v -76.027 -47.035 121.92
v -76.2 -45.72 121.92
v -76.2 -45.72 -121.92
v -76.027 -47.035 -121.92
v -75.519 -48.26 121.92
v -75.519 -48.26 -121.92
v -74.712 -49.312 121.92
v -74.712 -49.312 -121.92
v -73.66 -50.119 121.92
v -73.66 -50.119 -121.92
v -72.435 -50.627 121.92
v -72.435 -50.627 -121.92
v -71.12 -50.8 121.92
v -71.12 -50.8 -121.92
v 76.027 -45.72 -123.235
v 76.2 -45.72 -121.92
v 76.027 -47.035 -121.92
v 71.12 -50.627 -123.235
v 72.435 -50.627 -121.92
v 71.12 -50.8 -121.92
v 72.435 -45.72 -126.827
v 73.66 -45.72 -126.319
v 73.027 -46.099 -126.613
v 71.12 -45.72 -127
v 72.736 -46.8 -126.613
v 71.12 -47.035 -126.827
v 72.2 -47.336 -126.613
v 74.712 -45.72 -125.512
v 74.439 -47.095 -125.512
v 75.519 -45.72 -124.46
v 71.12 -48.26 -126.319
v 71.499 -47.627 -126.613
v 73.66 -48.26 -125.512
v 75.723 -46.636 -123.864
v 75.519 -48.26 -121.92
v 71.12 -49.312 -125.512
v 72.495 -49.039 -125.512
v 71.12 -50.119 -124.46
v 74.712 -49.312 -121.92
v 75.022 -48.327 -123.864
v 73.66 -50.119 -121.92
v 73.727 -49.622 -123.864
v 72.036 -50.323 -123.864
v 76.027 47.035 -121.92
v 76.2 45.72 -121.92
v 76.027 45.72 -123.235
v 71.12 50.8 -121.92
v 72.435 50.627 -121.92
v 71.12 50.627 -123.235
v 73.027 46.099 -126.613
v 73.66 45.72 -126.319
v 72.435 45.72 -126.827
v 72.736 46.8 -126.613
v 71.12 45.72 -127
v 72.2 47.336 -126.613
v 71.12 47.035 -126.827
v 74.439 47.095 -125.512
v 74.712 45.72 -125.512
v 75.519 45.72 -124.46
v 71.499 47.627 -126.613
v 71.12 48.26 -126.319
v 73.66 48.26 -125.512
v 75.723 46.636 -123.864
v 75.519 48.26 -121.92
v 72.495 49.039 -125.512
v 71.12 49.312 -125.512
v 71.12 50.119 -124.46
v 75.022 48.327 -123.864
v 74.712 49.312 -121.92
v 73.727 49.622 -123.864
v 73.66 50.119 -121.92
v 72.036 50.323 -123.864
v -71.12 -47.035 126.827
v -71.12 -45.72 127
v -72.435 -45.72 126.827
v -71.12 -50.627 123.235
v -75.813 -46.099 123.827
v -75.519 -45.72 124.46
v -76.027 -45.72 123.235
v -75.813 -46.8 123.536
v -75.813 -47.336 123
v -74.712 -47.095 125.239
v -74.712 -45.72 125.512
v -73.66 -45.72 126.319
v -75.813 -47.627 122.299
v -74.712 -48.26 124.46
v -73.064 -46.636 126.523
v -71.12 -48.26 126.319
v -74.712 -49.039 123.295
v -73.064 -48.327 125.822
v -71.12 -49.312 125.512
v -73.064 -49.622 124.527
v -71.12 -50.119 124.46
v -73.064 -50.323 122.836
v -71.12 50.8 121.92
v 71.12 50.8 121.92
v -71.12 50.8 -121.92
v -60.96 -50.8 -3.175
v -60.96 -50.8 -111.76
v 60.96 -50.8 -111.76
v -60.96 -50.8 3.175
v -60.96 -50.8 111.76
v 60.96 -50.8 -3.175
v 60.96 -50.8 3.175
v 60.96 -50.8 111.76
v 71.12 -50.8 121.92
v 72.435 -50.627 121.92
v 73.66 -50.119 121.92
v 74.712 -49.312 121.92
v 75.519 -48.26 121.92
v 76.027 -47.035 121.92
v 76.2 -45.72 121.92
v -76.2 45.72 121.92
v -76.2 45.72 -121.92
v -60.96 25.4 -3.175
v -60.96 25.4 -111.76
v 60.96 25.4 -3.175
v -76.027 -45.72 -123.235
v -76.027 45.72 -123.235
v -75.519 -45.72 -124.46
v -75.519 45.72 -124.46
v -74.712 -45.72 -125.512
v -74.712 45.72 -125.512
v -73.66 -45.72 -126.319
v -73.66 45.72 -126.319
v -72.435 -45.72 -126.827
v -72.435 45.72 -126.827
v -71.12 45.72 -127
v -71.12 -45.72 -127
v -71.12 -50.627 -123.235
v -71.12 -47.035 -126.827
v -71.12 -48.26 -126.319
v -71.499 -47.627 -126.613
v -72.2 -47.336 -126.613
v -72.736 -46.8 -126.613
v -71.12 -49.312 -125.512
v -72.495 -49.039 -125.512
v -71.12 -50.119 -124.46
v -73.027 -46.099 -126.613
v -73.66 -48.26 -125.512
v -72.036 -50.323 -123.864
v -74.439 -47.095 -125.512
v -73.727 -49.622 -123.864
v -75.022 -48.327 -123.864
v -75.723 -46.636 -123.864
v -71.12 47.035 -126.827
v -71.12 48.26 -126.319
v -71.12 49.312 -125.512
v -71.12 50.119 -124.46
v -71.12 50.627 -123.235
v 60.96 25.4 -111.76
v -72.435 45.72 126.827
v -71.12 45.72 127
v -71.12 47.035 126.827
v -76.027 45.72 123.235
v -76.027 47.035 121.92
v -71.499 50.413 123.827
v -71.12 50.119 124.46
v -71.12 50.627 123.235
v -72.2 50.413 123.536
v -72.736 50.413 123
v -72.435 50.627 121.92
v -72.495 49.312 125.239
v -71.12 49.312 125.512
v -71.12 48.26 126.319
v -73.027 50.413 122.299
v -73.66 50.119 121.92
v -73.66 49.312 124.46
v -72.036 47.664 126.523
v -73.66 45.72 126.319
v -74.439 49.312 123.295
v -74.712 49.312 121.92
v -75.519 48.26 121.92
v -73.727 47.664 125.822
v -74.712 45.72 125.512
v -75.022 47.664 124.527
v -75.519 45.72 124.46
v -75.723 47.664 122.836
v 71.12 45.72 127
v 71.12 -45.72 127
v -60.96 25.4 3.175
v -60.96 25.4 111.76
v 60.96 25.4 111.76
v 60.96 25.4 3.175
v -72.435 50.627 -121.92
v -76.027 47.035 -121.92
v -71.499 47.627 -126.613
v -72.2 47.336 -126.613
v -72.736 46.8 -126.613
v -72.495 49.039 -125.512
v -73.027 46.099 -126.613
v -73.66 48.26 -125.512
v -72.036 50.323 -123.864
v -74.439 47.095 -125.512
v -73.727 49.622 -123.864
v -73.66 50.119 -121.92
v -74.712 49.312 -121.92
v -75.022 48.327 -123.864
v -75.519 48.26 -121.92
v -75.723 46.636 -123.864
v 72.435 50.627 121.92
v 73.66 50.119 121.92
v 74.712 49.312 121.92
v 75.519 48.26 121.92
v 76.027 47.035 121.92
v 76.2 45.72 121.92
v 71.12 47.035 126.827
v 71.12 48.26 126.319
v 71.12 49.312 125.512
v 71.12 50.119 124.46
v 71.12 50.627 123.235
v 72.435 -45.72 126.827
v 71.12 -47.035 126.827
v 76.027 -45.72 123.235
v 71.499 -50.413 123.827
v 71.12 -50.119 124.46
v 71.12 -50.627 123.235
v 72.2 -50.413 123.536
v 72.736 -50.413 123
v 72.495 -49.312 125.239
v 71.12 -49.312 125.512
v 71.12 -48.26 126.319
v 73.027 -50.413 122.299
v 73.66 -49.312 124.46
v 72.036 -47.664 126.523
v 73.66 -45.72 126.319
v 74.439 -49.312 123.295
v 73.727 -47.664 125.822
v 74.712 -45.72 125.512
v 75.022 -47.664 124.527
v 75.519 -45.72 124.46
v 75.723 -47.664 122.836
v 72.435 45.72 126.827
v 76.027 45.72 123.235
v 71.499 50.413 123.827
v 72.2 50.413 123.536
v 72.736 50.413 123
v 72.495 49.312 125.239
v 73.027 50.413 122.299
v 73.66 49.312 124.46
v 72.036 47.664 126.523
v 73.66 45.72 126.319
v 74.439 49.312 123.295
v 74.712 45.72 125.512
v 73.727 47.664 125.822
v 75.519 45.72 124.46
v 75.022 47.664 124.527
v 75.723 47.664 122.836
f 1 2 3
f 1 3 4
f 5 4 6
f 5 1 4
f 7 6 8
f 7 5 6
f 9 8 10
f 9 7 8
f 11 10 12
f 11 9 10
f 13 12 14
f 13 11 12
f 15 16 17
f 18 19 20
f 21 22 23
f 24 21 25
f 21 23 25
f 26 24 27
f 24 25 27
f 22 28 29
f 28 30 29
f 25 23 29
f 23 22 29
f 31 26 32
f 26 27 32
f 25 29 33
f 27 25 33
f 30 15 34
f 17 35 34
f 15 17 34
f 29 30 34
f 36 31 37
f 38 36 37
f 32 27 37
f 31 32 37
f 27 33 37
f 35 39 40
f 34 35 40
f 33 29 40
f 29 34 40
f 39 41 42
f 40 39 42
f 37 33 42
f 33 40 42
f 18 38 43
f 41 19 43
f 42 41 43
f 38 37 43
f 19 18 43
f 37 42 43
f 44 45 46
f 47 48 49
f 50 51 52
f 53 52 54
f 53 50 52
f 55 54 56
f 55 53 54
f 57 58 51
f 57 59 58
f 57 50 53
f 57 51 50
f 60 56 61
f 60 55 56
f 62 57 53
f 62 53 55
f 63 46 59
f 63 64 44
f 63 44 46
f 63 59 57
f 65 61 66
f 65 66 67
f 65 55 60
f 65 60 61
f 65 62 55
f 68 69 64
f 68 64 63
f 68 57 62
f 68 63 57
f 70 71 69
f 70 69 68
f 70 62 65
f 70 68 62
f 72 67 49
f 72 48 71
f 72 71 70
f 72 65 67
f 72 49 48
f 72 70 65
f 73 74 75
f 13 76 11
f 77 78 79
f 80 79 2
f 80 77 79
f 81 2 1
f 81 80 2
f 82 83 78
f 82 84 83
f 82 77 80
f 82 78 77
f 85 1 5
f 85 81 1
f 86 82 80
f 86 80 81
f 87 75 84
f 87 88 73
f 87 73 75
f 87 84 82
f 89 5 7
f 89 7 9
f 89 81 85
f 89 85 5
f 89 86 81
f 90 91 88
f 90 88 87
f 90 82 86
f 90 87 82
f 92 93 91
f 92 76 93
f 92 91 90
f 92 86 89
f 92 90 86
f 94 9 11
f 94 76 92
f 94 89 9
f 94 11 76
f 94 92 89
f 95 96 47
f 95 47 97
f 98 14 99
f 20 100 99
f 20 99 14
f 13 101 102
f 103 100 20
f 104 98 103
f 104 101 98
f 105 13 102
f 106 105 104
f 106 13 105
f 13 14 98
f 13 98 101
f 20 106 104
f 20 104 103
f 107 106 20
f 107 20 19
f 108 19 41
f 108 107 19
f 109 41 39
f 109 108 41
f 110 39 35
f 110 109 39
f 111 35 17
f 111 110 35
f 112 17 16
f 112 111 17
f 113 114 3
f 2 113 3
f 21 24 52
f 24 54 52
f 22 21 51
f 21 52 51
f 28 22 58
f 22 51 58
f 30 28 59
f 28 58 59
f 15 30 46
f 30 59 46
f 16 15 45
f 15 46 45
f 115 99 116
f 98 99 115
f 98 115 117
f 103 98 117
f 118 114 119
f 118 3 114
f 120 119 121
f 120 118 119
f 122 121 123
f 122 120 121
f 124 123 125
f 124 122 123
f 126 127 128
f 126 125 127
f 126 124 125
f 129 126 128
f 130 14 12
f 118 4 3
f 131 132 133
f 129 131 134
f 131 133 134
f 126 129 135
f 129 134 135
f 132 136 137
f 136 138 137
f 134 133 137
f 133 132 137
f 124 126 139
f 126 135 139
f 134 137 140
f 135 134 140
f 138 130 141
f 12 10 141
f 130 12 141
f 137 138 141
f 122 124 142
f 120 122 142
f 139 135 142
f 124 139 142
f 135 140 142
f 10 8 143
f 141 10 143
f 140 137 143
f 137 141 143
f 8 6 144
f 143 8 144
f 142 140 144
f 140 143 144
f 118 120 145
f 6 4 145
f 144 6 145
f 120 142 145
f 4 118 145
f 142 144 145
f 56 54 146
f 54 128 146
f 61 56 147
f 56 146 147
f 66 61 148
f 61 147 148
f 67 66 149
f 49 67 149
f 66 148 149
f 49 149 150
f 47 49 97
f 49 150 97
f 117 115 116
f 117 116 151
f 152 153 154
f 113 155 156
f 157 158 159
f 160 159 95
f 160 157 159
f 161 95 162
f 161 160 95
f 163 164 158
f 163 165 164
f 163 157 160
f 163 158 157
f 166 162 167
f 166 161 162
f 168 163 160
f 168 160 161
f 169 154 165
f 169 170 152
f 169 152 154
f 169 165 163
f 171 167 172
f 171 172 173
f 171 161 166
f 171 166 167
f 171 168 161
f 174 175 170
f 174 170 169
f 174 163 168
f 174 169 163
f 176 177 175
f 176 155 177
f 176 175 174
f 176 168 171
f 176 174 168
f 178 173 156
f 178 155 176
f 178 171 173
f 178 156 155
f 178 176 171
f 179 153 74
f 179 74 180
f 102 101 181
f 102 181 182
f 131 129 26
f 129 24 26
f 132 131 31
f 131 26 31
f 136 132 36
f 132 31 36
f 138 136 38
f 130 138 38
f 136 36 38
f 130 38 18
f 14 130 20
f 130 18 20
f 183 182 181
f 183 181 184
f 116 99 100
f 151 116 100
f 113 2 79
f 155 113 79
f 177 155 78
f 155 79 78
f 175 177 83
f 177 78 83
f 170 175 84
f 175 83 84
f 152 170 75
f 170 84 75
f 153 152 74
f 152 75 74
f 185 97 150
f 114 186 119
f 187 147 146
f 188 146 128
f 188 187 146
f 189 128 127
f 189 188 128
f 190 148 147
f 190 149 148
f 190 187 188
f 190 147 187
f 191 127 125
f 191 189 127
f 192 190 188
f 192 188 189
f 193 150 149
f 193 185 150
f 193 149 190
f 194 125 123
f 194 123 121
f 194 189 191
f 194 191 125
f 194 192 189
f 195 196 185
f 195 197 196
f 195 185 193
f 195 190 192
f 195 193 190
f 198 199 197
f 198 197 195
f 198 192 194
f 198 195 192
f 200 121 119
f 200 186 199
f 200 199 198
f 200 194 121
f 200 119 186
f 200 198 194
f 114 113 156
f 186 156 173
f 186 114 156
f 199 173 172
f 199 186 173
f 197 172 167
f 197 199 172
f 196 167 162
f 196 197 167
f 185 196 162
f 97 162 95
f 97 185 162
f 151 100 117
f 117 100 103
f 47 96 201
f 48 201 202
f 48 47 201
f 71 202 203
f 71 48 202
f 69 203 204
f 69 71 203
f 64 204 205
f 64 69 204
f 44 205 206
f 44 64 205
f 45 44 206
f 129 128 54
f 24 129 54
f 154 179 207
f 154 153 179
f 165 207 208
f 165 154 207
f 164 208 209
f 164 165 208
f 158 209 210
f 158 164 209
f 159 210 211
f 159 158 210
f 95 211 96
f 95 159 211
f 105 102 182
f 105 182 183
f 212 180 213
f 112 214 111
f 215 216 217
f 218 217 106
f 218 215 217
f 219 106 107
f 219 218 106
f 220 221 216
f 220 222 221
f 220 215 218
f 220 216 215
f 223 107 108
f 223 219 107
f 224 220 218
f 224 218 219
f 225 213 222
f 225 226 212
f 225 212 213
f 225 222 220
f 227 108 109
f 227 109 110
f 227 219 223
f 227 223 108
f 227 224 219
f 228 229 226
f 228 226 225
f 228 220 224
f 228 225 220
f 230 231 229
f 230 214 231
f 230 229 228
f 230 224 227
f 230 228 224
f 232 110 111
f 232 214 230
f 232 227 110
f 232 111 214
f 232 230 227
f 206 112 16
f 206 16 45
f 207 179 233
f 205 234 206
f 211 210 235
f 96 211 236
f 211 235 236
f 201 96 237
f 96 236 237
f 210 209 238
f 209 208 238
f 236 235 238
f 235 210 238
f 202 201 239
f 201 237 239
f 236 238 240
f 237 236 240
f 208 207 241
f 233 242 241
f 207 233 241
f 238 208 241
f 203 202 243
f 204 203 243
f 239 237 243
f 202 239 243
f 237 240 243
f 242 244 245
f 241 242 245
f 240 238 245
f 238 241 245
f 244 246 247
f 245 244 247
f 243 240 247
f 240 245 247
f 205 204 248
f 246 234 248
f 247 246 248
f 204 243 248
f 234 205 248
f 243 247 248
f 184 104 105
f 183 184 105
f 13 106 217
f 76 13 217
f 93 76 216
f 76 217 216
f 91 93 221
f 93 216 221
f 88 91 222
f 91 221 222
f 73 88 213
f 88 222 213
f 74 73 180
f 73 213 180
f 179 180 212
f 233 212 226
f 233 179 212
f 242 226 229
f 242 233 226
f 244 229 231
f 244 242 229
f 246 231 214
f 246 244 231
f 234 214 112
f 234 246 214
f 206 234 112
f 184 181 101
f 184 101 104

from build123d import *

# Parameters (mm, degrees)
F1_DEPTH = 127
F2_W     = 121.92
F2_H     = 223.52
F3_DEPTH = 76.2
F4_R     = 5.08
F5_W     = 121.92
F5_H     = 6.35
F6_DEPTH = 76.2


with BuildPart() as f1:
    # F0 (on Top) → F1 (new body, symmetric)
    with BuildSketch(Plane.XY):
        Polygon((-76.2, 50.8), (-76.2, -50.8), (-68.293229, -50.8), (68.293229, -50.8), (76.2, -50.8), (76.2, 50.8), align=None)
    extrude(amount=F1_DEPTH, both=True)

    # F2 (on face) → F3 (cut)
    with BuildSketch(Plane.XZ.offset(50.8)):
        Rectangle(F2_W, F2_H)
    extrude(amount=-F3_DEPTH, mode=Mode.SUBTRACT)

    # F4
    f4_edges = [f1.edges().sort_by_distance(p)[0] for p in [
        (76.2, 0, 127),
        (0, -50.8, 127),
        (-76.2, 0, 127),
        (0, 50.8, 127),
        (76.2, -50.8, 0),
        (-76.2, -50.8, 0),
        (76.2, 50.8, 0),
        (76.2, 0, -127),
        (0, -50.8, -127),
        (-76.2, 50.8, 0),
        (0, 50.8, -127),
        (-76.2, 0, -127),
    ]]
    fillet(f4_edges, radius=F4_R)

    # F5 (on face) → F6 (join)
    with BuildSketch(Plane.XZ.offset(-25.4)):
        Rectangle(F5_W, F5_H)
    extrude(amount=F6_DEPTH)


solid = f1.part
